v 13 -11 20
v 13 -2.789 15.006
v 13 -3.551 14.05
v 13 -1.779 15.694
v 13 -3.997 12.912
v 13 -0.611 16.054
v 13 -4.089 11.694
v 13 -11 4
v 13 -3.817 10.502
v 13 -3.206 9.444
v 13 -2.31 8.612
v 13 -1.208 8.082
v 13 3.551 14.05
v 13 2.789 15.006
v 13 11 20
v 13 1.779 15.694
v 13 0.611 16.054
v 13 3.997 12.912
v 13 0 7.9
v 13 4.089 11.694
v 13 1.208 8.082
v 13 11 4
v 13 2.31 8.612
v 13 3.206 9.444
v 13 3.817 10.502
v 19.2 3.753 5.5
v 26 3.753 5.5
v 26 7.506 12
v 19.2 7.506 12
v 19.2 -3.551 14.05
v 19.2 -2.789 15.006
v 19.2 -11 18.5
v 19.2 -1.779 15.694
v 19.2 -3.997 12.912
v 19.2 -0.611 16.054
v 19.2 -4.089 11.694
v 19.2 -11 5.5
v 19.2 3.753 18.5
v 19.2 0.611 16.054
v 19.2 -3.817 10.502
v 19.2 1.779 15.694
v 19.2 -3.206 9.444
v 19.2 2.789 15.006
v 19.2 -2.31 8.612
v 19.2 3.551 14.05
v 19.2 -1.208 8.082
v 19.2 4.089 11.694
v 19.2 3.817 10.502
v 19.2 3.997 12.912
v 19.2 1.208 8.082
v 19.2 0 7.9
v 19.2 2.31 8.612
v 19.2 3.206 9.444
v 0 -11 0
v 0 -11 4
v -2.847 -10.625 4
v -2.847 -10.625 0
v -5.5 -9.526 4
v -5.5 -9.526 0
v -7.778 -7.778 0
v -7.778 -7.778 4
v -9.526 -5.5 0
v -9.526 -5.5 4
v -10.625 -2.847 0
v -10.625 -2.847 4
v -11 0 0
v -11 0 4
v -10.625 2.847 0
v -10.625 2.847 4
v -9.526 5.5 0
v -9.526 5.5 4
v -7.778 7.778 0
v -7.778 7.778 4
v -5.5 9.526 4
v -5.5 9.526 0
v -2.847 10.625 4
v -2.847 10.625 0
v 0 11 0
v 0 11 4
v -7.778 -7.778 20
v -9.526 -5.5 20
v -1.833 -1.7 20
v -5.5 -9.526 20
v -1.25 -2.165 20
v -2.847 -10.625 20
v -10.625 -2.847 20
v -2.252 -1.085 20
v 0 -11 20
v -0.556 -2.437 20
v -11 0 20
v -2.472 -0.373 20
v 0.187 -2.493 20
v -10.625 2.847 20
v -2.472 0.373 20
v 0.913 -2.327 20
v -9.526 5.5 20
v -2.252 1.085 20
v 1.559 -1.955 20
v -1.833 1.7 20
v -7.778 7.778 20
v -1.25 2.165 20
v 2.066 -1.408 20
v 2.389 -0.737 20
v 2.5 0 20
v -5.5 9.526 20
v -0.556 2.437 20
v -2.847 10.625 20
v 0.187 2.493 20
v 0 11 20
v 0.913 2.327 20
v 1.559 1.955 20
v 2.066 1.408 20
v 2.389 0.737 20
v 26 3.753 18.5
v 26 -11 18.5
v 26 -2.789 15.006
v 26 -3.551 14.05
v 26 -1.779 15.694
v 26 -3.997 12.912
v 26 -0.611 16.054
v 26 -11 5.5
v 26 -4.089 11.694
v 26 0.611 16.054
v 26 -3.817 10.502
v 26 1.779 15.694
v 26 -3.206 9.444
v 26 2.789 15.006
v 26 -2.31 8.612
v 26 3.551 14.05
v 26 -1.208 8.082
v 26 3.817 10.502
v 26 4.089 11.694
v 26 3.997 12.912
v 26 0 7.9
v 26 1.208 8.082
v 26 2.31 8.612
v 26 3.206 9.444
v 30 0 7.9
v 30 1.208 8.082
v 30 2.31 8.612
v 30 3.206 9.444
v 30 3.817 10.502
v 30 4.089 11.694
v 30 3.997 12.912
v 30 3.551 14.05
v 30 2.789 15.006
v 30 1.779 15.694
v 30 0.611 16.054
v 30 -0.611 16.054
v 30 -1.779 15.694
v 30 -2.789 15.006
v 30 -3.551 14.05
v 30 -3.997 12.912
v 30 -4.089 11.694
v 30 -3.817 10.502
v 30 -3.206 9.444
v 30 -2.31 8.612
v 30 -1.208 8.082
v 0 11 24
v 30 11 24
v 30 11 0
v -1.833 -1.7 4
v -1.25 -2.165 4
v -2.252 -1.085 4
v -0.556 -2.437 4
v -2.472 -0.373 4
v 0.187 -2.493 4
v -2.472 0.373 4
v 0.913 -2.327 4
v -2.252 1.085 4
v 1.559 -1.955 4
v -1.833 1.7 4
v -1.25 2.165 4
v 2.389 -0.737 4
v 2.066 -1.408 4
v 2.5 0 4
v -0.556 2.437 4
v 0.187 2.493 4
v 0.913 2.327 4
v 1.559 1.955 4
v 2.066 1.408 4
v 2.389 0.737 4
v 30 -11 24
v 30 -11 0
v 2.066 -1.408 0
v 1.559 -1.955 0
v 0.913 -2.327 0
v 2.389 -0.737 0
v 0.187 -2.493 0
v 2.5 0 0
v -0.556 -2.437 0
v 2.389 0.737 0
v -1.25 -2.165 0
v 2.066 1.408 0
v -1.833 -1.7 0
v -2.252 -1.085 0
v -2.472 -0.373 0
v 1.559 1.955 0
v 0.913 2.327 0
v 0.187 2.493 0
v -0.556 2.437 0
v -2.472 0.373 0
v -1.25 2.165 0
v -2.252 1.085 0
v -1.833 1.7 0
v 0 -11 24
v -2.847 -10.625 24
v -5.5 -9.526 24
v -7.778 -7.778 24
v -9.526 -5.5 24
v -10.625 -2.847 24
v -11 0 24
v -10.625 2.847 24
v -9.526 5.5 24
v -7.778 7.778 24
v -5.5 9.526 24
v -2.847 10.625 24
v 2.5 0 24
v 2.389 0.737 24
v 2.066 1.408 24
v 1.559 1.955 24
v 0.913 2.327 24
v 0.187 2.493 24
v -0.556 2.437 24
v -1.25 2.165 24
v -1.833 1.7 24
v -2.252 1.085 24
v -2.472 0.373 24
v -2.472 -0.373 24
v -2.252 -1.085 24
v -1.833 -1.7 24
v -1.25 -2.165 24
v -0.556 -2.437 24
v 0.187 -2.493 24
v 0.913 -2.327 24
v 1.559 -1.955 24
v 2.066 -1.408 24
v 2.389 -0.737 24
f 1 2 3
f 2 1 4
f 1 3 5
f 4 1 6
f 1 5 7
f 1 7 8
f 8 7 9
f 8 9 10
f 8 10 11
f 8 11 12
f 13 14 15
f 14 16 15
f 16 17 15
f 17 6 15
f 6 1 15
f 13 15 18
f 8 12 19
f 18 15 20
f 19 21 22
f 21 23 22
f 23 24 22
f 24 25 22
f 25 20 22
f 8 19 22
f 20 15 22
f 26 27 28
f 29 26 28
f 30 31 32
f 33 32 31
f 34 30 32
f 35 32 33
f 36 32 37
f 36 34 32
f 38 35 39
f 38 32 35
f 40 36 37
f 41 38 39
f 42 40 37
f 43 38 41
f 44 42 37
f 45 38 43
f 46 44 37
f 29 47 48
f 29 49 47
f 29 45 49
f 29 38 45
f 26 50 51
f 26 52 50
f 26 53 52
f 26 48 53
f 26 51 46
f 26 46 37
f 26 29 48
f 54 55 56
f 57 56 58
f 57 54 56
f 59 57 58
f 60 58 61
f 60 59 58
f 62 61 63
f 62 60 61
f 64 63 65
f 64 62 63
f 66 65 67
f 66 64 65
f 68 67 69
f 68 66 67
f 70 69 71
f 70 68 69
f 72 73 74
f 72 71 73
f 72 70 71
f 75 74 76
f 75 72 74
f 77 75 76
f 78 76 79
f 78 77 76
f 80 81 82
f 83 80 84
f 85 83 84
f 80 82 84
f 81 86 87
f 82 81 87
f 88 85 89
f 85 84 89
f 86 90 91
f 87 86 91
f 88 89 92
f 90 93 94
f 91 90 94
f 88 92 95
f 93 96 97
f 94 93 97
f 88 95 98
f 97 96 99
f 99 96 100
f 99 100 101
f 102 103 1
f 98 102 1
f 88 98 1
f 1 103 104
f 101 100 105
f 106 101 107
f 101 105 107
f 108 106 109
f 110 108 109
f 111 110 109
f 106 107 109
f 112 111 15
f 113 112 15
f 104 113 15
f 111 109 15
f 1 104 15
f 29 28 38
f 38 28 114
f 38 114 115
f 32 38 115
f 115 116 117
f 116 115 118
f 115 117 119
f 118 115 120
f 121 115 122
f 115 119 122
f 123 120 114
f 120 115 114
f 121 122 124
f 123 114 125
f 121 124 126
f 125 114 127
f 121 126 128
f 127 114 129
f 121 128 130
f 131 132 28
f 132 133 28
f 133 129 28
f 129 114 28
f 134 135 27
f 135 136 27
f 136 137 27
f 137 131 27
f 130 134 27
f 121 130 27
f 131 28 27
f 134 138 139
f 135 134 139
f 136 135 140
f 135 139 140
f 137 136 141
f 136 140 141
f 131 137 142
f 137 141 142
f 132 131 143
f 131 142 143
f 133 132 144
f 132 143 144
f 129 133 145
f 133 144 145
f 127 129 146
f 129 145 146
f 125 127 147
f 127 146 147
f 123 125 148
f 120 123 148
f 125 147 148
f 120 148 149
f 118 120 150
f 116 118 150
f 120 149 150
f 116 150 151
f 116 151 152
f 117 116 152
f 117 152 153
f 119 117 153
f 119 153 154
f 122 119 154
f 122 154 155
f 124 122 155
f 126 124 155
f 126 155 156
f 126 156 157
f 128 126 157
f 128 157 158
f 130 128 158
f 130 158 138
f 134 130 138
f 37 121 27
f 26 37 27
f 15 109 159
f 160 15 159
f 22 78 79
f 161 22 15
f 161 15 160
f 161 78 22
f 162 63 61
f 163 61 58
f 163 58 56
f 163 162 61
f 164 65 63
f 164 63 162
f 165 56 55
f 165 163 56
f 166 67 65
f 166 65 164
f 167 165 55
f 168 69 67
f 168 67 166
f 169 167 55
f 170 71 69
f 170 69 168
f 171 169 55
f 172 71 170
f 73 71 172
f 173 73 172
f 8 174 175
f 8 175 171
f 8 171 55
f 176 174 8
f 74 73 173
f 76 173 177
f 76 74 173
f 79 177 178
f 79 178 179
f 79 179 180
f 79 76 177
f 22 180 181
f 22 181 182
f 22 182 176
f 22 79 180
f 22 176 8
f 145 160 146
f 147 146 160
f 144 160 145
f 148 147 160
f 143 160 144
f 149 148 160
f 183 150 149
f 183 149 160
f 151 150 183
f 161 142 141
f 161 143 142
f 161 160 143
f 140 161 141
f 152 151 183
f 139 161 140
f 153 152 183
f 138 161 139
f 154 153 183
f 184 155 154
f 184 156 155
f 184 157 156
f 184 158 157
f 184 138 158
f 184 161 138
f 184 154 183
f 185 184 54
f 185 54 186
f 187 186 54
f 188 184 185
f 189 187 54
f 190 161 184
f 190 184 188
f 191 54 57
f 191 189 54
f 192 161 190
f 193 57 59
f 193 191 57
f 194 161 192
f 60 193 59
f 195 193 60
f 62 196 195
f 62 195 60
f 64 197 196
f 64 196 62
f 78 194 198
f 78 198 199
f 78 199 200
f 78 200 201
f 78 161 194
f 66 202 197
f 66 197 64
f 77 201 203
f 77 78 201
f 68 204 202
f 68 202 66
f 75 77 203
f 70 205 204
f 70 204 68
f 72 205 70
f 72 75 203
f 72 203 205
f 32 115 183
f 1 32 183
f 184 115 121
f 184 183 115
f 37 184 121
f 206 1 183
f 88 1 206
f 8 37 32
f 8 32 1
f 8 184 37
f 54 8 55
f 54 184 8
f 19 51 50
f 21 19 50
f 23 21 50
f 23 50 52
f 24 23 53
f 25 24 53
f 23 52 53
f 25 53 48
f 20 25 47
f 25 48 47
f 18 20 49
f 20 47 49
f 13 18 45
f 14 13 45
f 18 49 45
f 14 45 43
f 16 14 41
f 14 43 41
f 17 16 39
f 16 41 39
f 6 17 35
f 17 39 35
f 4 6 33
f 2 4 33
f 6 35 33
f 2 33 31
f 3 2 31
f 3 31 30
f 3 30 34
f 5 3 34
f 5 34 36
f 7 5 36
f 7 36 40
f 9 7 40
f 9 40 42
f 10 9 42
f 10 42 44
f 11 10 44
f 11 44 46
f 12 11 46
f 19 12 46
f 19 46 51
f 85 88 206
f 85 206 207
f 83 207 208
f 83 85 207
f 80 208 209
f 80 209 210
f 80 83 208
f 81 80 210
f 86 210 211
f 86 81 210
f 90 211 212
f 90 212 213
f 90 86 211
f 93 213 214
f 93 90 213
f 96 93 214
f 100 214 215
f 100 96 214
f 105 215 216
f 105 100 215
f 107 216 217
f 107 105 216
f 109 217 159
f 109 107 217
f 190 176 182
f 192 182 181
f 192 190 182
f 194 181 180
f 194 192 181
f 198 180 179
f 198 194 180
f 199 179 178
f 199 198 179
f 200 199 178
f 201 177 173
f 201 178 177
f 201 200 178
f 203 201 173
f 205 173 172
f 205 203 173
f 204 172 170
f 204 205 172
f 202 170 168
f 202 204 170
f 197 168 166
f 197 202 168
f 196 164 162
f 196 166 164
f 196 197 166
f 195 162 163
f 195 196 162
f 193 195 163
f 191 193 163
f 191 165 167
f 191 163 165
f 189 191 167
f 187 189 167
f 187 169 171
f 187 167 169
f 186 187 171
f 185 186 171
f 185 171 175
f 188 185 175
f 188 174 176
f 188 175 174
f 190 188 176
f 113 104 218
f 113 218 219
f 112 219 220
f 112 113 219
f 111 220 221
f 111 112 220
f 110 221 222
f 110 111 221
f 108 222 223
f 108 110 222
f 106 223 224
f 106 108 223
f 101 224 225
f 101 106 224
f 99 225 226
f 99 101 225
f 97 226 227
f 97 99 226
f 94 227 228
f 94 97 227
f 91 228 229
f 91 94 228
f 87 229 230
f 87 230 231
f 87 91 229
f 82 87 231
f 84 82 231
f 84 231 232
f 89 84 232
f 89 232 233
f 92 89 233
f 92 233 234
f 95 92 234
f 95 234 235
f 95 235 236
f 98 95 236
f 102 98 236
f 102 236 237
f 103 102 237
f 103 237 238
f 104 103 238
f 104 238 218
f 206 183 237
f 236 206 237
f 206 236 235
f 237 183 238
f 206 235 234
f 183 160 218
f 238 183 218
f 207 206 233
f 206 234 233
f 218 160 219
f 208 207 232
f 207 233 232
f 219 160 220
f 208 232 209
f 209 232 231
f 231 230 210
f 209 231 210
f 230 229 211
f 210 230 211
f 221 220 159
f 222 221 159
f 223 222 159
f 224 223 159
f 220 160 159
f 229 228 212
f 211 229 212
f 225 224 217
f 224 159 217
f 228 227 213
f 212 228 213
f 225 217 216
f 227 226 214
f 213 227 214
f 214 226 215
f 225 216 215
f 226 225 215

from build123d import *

# Parameters (mm, degrees)
SKETCH1_R           = 2.5
BOSS_EXTRUDE1_DEPTH = 24
SKETCH2_W           = 24
SKETCH2_H           = 16
CUT_EXTRUDE1_DEPTH  = 23
CUT_EXTRUDE2_DEPTH  = 6.8
SKETCH6_R           = 4.1
CUT_EXTRUDE3_DEPTH  = 17


with BuildPart() as part:
    # Sketch1 → Boss-Extrude1 (new body)
    with BuildSketch(Plane.XY):
        with BuildLine():
            Line((0, 11), (30, 11))
            Line((30, 11), (30, -11))
            Line((30, -11), (0, -11))
            ThreePointArc((0, -11), (-11, 0), (0, 11))
        make_face()
        Circle(SKETCH1_R, mode=Mode.SUBTRACT)
    extrude(amount=BOSS_EXTRUDE1_DEPTH)

    # Sketch2 → Cut-Extrude1 (cut, through all)
    with BuildSketch(Plane(origin=(0, 11, 0), x_dir=(1, 0, 0), z_dir=(0, 1, 0))):
        with Locations((1, -12)):
            Rectangle(SKETCH2_W, SKETCH2_H)
    extrude(amount=-CUT_EXTRUDE1_DEPTH, mode=Mode.SUBTRACT)

    # Sketch4 → Cut-Extrude2 (cut)
    with BuildSketch(Plane(origin=(26, 0, 0), x_dir=(0, 0, -1), z_dir=(1, 0, 0))):
        Polygon((-18.5, 3.75277675), (-18.5, -11), (-5.5, -11), (-5.5, 3.75277675), (-12, 7.505553499), align=None)
    extrude(amount=-CUT_EXTRUDE2_DEPTH, mode=Mode.SUBTRACT)

    # Sketch6 → Cut-Extrude3 (cut)
    with BuildSketch(Plane(origin=(30, 0, 0), x_dir=(0, 0, -1), z_dir=(1, 0, 0))):
        with Locations((-12, 0)):
            Circle(SKETCH6_R)
    extrude(amount=-CUT_EXTRUDE3_DEPTH, mode=Mode.SUBTRACT)


solid = part.part
